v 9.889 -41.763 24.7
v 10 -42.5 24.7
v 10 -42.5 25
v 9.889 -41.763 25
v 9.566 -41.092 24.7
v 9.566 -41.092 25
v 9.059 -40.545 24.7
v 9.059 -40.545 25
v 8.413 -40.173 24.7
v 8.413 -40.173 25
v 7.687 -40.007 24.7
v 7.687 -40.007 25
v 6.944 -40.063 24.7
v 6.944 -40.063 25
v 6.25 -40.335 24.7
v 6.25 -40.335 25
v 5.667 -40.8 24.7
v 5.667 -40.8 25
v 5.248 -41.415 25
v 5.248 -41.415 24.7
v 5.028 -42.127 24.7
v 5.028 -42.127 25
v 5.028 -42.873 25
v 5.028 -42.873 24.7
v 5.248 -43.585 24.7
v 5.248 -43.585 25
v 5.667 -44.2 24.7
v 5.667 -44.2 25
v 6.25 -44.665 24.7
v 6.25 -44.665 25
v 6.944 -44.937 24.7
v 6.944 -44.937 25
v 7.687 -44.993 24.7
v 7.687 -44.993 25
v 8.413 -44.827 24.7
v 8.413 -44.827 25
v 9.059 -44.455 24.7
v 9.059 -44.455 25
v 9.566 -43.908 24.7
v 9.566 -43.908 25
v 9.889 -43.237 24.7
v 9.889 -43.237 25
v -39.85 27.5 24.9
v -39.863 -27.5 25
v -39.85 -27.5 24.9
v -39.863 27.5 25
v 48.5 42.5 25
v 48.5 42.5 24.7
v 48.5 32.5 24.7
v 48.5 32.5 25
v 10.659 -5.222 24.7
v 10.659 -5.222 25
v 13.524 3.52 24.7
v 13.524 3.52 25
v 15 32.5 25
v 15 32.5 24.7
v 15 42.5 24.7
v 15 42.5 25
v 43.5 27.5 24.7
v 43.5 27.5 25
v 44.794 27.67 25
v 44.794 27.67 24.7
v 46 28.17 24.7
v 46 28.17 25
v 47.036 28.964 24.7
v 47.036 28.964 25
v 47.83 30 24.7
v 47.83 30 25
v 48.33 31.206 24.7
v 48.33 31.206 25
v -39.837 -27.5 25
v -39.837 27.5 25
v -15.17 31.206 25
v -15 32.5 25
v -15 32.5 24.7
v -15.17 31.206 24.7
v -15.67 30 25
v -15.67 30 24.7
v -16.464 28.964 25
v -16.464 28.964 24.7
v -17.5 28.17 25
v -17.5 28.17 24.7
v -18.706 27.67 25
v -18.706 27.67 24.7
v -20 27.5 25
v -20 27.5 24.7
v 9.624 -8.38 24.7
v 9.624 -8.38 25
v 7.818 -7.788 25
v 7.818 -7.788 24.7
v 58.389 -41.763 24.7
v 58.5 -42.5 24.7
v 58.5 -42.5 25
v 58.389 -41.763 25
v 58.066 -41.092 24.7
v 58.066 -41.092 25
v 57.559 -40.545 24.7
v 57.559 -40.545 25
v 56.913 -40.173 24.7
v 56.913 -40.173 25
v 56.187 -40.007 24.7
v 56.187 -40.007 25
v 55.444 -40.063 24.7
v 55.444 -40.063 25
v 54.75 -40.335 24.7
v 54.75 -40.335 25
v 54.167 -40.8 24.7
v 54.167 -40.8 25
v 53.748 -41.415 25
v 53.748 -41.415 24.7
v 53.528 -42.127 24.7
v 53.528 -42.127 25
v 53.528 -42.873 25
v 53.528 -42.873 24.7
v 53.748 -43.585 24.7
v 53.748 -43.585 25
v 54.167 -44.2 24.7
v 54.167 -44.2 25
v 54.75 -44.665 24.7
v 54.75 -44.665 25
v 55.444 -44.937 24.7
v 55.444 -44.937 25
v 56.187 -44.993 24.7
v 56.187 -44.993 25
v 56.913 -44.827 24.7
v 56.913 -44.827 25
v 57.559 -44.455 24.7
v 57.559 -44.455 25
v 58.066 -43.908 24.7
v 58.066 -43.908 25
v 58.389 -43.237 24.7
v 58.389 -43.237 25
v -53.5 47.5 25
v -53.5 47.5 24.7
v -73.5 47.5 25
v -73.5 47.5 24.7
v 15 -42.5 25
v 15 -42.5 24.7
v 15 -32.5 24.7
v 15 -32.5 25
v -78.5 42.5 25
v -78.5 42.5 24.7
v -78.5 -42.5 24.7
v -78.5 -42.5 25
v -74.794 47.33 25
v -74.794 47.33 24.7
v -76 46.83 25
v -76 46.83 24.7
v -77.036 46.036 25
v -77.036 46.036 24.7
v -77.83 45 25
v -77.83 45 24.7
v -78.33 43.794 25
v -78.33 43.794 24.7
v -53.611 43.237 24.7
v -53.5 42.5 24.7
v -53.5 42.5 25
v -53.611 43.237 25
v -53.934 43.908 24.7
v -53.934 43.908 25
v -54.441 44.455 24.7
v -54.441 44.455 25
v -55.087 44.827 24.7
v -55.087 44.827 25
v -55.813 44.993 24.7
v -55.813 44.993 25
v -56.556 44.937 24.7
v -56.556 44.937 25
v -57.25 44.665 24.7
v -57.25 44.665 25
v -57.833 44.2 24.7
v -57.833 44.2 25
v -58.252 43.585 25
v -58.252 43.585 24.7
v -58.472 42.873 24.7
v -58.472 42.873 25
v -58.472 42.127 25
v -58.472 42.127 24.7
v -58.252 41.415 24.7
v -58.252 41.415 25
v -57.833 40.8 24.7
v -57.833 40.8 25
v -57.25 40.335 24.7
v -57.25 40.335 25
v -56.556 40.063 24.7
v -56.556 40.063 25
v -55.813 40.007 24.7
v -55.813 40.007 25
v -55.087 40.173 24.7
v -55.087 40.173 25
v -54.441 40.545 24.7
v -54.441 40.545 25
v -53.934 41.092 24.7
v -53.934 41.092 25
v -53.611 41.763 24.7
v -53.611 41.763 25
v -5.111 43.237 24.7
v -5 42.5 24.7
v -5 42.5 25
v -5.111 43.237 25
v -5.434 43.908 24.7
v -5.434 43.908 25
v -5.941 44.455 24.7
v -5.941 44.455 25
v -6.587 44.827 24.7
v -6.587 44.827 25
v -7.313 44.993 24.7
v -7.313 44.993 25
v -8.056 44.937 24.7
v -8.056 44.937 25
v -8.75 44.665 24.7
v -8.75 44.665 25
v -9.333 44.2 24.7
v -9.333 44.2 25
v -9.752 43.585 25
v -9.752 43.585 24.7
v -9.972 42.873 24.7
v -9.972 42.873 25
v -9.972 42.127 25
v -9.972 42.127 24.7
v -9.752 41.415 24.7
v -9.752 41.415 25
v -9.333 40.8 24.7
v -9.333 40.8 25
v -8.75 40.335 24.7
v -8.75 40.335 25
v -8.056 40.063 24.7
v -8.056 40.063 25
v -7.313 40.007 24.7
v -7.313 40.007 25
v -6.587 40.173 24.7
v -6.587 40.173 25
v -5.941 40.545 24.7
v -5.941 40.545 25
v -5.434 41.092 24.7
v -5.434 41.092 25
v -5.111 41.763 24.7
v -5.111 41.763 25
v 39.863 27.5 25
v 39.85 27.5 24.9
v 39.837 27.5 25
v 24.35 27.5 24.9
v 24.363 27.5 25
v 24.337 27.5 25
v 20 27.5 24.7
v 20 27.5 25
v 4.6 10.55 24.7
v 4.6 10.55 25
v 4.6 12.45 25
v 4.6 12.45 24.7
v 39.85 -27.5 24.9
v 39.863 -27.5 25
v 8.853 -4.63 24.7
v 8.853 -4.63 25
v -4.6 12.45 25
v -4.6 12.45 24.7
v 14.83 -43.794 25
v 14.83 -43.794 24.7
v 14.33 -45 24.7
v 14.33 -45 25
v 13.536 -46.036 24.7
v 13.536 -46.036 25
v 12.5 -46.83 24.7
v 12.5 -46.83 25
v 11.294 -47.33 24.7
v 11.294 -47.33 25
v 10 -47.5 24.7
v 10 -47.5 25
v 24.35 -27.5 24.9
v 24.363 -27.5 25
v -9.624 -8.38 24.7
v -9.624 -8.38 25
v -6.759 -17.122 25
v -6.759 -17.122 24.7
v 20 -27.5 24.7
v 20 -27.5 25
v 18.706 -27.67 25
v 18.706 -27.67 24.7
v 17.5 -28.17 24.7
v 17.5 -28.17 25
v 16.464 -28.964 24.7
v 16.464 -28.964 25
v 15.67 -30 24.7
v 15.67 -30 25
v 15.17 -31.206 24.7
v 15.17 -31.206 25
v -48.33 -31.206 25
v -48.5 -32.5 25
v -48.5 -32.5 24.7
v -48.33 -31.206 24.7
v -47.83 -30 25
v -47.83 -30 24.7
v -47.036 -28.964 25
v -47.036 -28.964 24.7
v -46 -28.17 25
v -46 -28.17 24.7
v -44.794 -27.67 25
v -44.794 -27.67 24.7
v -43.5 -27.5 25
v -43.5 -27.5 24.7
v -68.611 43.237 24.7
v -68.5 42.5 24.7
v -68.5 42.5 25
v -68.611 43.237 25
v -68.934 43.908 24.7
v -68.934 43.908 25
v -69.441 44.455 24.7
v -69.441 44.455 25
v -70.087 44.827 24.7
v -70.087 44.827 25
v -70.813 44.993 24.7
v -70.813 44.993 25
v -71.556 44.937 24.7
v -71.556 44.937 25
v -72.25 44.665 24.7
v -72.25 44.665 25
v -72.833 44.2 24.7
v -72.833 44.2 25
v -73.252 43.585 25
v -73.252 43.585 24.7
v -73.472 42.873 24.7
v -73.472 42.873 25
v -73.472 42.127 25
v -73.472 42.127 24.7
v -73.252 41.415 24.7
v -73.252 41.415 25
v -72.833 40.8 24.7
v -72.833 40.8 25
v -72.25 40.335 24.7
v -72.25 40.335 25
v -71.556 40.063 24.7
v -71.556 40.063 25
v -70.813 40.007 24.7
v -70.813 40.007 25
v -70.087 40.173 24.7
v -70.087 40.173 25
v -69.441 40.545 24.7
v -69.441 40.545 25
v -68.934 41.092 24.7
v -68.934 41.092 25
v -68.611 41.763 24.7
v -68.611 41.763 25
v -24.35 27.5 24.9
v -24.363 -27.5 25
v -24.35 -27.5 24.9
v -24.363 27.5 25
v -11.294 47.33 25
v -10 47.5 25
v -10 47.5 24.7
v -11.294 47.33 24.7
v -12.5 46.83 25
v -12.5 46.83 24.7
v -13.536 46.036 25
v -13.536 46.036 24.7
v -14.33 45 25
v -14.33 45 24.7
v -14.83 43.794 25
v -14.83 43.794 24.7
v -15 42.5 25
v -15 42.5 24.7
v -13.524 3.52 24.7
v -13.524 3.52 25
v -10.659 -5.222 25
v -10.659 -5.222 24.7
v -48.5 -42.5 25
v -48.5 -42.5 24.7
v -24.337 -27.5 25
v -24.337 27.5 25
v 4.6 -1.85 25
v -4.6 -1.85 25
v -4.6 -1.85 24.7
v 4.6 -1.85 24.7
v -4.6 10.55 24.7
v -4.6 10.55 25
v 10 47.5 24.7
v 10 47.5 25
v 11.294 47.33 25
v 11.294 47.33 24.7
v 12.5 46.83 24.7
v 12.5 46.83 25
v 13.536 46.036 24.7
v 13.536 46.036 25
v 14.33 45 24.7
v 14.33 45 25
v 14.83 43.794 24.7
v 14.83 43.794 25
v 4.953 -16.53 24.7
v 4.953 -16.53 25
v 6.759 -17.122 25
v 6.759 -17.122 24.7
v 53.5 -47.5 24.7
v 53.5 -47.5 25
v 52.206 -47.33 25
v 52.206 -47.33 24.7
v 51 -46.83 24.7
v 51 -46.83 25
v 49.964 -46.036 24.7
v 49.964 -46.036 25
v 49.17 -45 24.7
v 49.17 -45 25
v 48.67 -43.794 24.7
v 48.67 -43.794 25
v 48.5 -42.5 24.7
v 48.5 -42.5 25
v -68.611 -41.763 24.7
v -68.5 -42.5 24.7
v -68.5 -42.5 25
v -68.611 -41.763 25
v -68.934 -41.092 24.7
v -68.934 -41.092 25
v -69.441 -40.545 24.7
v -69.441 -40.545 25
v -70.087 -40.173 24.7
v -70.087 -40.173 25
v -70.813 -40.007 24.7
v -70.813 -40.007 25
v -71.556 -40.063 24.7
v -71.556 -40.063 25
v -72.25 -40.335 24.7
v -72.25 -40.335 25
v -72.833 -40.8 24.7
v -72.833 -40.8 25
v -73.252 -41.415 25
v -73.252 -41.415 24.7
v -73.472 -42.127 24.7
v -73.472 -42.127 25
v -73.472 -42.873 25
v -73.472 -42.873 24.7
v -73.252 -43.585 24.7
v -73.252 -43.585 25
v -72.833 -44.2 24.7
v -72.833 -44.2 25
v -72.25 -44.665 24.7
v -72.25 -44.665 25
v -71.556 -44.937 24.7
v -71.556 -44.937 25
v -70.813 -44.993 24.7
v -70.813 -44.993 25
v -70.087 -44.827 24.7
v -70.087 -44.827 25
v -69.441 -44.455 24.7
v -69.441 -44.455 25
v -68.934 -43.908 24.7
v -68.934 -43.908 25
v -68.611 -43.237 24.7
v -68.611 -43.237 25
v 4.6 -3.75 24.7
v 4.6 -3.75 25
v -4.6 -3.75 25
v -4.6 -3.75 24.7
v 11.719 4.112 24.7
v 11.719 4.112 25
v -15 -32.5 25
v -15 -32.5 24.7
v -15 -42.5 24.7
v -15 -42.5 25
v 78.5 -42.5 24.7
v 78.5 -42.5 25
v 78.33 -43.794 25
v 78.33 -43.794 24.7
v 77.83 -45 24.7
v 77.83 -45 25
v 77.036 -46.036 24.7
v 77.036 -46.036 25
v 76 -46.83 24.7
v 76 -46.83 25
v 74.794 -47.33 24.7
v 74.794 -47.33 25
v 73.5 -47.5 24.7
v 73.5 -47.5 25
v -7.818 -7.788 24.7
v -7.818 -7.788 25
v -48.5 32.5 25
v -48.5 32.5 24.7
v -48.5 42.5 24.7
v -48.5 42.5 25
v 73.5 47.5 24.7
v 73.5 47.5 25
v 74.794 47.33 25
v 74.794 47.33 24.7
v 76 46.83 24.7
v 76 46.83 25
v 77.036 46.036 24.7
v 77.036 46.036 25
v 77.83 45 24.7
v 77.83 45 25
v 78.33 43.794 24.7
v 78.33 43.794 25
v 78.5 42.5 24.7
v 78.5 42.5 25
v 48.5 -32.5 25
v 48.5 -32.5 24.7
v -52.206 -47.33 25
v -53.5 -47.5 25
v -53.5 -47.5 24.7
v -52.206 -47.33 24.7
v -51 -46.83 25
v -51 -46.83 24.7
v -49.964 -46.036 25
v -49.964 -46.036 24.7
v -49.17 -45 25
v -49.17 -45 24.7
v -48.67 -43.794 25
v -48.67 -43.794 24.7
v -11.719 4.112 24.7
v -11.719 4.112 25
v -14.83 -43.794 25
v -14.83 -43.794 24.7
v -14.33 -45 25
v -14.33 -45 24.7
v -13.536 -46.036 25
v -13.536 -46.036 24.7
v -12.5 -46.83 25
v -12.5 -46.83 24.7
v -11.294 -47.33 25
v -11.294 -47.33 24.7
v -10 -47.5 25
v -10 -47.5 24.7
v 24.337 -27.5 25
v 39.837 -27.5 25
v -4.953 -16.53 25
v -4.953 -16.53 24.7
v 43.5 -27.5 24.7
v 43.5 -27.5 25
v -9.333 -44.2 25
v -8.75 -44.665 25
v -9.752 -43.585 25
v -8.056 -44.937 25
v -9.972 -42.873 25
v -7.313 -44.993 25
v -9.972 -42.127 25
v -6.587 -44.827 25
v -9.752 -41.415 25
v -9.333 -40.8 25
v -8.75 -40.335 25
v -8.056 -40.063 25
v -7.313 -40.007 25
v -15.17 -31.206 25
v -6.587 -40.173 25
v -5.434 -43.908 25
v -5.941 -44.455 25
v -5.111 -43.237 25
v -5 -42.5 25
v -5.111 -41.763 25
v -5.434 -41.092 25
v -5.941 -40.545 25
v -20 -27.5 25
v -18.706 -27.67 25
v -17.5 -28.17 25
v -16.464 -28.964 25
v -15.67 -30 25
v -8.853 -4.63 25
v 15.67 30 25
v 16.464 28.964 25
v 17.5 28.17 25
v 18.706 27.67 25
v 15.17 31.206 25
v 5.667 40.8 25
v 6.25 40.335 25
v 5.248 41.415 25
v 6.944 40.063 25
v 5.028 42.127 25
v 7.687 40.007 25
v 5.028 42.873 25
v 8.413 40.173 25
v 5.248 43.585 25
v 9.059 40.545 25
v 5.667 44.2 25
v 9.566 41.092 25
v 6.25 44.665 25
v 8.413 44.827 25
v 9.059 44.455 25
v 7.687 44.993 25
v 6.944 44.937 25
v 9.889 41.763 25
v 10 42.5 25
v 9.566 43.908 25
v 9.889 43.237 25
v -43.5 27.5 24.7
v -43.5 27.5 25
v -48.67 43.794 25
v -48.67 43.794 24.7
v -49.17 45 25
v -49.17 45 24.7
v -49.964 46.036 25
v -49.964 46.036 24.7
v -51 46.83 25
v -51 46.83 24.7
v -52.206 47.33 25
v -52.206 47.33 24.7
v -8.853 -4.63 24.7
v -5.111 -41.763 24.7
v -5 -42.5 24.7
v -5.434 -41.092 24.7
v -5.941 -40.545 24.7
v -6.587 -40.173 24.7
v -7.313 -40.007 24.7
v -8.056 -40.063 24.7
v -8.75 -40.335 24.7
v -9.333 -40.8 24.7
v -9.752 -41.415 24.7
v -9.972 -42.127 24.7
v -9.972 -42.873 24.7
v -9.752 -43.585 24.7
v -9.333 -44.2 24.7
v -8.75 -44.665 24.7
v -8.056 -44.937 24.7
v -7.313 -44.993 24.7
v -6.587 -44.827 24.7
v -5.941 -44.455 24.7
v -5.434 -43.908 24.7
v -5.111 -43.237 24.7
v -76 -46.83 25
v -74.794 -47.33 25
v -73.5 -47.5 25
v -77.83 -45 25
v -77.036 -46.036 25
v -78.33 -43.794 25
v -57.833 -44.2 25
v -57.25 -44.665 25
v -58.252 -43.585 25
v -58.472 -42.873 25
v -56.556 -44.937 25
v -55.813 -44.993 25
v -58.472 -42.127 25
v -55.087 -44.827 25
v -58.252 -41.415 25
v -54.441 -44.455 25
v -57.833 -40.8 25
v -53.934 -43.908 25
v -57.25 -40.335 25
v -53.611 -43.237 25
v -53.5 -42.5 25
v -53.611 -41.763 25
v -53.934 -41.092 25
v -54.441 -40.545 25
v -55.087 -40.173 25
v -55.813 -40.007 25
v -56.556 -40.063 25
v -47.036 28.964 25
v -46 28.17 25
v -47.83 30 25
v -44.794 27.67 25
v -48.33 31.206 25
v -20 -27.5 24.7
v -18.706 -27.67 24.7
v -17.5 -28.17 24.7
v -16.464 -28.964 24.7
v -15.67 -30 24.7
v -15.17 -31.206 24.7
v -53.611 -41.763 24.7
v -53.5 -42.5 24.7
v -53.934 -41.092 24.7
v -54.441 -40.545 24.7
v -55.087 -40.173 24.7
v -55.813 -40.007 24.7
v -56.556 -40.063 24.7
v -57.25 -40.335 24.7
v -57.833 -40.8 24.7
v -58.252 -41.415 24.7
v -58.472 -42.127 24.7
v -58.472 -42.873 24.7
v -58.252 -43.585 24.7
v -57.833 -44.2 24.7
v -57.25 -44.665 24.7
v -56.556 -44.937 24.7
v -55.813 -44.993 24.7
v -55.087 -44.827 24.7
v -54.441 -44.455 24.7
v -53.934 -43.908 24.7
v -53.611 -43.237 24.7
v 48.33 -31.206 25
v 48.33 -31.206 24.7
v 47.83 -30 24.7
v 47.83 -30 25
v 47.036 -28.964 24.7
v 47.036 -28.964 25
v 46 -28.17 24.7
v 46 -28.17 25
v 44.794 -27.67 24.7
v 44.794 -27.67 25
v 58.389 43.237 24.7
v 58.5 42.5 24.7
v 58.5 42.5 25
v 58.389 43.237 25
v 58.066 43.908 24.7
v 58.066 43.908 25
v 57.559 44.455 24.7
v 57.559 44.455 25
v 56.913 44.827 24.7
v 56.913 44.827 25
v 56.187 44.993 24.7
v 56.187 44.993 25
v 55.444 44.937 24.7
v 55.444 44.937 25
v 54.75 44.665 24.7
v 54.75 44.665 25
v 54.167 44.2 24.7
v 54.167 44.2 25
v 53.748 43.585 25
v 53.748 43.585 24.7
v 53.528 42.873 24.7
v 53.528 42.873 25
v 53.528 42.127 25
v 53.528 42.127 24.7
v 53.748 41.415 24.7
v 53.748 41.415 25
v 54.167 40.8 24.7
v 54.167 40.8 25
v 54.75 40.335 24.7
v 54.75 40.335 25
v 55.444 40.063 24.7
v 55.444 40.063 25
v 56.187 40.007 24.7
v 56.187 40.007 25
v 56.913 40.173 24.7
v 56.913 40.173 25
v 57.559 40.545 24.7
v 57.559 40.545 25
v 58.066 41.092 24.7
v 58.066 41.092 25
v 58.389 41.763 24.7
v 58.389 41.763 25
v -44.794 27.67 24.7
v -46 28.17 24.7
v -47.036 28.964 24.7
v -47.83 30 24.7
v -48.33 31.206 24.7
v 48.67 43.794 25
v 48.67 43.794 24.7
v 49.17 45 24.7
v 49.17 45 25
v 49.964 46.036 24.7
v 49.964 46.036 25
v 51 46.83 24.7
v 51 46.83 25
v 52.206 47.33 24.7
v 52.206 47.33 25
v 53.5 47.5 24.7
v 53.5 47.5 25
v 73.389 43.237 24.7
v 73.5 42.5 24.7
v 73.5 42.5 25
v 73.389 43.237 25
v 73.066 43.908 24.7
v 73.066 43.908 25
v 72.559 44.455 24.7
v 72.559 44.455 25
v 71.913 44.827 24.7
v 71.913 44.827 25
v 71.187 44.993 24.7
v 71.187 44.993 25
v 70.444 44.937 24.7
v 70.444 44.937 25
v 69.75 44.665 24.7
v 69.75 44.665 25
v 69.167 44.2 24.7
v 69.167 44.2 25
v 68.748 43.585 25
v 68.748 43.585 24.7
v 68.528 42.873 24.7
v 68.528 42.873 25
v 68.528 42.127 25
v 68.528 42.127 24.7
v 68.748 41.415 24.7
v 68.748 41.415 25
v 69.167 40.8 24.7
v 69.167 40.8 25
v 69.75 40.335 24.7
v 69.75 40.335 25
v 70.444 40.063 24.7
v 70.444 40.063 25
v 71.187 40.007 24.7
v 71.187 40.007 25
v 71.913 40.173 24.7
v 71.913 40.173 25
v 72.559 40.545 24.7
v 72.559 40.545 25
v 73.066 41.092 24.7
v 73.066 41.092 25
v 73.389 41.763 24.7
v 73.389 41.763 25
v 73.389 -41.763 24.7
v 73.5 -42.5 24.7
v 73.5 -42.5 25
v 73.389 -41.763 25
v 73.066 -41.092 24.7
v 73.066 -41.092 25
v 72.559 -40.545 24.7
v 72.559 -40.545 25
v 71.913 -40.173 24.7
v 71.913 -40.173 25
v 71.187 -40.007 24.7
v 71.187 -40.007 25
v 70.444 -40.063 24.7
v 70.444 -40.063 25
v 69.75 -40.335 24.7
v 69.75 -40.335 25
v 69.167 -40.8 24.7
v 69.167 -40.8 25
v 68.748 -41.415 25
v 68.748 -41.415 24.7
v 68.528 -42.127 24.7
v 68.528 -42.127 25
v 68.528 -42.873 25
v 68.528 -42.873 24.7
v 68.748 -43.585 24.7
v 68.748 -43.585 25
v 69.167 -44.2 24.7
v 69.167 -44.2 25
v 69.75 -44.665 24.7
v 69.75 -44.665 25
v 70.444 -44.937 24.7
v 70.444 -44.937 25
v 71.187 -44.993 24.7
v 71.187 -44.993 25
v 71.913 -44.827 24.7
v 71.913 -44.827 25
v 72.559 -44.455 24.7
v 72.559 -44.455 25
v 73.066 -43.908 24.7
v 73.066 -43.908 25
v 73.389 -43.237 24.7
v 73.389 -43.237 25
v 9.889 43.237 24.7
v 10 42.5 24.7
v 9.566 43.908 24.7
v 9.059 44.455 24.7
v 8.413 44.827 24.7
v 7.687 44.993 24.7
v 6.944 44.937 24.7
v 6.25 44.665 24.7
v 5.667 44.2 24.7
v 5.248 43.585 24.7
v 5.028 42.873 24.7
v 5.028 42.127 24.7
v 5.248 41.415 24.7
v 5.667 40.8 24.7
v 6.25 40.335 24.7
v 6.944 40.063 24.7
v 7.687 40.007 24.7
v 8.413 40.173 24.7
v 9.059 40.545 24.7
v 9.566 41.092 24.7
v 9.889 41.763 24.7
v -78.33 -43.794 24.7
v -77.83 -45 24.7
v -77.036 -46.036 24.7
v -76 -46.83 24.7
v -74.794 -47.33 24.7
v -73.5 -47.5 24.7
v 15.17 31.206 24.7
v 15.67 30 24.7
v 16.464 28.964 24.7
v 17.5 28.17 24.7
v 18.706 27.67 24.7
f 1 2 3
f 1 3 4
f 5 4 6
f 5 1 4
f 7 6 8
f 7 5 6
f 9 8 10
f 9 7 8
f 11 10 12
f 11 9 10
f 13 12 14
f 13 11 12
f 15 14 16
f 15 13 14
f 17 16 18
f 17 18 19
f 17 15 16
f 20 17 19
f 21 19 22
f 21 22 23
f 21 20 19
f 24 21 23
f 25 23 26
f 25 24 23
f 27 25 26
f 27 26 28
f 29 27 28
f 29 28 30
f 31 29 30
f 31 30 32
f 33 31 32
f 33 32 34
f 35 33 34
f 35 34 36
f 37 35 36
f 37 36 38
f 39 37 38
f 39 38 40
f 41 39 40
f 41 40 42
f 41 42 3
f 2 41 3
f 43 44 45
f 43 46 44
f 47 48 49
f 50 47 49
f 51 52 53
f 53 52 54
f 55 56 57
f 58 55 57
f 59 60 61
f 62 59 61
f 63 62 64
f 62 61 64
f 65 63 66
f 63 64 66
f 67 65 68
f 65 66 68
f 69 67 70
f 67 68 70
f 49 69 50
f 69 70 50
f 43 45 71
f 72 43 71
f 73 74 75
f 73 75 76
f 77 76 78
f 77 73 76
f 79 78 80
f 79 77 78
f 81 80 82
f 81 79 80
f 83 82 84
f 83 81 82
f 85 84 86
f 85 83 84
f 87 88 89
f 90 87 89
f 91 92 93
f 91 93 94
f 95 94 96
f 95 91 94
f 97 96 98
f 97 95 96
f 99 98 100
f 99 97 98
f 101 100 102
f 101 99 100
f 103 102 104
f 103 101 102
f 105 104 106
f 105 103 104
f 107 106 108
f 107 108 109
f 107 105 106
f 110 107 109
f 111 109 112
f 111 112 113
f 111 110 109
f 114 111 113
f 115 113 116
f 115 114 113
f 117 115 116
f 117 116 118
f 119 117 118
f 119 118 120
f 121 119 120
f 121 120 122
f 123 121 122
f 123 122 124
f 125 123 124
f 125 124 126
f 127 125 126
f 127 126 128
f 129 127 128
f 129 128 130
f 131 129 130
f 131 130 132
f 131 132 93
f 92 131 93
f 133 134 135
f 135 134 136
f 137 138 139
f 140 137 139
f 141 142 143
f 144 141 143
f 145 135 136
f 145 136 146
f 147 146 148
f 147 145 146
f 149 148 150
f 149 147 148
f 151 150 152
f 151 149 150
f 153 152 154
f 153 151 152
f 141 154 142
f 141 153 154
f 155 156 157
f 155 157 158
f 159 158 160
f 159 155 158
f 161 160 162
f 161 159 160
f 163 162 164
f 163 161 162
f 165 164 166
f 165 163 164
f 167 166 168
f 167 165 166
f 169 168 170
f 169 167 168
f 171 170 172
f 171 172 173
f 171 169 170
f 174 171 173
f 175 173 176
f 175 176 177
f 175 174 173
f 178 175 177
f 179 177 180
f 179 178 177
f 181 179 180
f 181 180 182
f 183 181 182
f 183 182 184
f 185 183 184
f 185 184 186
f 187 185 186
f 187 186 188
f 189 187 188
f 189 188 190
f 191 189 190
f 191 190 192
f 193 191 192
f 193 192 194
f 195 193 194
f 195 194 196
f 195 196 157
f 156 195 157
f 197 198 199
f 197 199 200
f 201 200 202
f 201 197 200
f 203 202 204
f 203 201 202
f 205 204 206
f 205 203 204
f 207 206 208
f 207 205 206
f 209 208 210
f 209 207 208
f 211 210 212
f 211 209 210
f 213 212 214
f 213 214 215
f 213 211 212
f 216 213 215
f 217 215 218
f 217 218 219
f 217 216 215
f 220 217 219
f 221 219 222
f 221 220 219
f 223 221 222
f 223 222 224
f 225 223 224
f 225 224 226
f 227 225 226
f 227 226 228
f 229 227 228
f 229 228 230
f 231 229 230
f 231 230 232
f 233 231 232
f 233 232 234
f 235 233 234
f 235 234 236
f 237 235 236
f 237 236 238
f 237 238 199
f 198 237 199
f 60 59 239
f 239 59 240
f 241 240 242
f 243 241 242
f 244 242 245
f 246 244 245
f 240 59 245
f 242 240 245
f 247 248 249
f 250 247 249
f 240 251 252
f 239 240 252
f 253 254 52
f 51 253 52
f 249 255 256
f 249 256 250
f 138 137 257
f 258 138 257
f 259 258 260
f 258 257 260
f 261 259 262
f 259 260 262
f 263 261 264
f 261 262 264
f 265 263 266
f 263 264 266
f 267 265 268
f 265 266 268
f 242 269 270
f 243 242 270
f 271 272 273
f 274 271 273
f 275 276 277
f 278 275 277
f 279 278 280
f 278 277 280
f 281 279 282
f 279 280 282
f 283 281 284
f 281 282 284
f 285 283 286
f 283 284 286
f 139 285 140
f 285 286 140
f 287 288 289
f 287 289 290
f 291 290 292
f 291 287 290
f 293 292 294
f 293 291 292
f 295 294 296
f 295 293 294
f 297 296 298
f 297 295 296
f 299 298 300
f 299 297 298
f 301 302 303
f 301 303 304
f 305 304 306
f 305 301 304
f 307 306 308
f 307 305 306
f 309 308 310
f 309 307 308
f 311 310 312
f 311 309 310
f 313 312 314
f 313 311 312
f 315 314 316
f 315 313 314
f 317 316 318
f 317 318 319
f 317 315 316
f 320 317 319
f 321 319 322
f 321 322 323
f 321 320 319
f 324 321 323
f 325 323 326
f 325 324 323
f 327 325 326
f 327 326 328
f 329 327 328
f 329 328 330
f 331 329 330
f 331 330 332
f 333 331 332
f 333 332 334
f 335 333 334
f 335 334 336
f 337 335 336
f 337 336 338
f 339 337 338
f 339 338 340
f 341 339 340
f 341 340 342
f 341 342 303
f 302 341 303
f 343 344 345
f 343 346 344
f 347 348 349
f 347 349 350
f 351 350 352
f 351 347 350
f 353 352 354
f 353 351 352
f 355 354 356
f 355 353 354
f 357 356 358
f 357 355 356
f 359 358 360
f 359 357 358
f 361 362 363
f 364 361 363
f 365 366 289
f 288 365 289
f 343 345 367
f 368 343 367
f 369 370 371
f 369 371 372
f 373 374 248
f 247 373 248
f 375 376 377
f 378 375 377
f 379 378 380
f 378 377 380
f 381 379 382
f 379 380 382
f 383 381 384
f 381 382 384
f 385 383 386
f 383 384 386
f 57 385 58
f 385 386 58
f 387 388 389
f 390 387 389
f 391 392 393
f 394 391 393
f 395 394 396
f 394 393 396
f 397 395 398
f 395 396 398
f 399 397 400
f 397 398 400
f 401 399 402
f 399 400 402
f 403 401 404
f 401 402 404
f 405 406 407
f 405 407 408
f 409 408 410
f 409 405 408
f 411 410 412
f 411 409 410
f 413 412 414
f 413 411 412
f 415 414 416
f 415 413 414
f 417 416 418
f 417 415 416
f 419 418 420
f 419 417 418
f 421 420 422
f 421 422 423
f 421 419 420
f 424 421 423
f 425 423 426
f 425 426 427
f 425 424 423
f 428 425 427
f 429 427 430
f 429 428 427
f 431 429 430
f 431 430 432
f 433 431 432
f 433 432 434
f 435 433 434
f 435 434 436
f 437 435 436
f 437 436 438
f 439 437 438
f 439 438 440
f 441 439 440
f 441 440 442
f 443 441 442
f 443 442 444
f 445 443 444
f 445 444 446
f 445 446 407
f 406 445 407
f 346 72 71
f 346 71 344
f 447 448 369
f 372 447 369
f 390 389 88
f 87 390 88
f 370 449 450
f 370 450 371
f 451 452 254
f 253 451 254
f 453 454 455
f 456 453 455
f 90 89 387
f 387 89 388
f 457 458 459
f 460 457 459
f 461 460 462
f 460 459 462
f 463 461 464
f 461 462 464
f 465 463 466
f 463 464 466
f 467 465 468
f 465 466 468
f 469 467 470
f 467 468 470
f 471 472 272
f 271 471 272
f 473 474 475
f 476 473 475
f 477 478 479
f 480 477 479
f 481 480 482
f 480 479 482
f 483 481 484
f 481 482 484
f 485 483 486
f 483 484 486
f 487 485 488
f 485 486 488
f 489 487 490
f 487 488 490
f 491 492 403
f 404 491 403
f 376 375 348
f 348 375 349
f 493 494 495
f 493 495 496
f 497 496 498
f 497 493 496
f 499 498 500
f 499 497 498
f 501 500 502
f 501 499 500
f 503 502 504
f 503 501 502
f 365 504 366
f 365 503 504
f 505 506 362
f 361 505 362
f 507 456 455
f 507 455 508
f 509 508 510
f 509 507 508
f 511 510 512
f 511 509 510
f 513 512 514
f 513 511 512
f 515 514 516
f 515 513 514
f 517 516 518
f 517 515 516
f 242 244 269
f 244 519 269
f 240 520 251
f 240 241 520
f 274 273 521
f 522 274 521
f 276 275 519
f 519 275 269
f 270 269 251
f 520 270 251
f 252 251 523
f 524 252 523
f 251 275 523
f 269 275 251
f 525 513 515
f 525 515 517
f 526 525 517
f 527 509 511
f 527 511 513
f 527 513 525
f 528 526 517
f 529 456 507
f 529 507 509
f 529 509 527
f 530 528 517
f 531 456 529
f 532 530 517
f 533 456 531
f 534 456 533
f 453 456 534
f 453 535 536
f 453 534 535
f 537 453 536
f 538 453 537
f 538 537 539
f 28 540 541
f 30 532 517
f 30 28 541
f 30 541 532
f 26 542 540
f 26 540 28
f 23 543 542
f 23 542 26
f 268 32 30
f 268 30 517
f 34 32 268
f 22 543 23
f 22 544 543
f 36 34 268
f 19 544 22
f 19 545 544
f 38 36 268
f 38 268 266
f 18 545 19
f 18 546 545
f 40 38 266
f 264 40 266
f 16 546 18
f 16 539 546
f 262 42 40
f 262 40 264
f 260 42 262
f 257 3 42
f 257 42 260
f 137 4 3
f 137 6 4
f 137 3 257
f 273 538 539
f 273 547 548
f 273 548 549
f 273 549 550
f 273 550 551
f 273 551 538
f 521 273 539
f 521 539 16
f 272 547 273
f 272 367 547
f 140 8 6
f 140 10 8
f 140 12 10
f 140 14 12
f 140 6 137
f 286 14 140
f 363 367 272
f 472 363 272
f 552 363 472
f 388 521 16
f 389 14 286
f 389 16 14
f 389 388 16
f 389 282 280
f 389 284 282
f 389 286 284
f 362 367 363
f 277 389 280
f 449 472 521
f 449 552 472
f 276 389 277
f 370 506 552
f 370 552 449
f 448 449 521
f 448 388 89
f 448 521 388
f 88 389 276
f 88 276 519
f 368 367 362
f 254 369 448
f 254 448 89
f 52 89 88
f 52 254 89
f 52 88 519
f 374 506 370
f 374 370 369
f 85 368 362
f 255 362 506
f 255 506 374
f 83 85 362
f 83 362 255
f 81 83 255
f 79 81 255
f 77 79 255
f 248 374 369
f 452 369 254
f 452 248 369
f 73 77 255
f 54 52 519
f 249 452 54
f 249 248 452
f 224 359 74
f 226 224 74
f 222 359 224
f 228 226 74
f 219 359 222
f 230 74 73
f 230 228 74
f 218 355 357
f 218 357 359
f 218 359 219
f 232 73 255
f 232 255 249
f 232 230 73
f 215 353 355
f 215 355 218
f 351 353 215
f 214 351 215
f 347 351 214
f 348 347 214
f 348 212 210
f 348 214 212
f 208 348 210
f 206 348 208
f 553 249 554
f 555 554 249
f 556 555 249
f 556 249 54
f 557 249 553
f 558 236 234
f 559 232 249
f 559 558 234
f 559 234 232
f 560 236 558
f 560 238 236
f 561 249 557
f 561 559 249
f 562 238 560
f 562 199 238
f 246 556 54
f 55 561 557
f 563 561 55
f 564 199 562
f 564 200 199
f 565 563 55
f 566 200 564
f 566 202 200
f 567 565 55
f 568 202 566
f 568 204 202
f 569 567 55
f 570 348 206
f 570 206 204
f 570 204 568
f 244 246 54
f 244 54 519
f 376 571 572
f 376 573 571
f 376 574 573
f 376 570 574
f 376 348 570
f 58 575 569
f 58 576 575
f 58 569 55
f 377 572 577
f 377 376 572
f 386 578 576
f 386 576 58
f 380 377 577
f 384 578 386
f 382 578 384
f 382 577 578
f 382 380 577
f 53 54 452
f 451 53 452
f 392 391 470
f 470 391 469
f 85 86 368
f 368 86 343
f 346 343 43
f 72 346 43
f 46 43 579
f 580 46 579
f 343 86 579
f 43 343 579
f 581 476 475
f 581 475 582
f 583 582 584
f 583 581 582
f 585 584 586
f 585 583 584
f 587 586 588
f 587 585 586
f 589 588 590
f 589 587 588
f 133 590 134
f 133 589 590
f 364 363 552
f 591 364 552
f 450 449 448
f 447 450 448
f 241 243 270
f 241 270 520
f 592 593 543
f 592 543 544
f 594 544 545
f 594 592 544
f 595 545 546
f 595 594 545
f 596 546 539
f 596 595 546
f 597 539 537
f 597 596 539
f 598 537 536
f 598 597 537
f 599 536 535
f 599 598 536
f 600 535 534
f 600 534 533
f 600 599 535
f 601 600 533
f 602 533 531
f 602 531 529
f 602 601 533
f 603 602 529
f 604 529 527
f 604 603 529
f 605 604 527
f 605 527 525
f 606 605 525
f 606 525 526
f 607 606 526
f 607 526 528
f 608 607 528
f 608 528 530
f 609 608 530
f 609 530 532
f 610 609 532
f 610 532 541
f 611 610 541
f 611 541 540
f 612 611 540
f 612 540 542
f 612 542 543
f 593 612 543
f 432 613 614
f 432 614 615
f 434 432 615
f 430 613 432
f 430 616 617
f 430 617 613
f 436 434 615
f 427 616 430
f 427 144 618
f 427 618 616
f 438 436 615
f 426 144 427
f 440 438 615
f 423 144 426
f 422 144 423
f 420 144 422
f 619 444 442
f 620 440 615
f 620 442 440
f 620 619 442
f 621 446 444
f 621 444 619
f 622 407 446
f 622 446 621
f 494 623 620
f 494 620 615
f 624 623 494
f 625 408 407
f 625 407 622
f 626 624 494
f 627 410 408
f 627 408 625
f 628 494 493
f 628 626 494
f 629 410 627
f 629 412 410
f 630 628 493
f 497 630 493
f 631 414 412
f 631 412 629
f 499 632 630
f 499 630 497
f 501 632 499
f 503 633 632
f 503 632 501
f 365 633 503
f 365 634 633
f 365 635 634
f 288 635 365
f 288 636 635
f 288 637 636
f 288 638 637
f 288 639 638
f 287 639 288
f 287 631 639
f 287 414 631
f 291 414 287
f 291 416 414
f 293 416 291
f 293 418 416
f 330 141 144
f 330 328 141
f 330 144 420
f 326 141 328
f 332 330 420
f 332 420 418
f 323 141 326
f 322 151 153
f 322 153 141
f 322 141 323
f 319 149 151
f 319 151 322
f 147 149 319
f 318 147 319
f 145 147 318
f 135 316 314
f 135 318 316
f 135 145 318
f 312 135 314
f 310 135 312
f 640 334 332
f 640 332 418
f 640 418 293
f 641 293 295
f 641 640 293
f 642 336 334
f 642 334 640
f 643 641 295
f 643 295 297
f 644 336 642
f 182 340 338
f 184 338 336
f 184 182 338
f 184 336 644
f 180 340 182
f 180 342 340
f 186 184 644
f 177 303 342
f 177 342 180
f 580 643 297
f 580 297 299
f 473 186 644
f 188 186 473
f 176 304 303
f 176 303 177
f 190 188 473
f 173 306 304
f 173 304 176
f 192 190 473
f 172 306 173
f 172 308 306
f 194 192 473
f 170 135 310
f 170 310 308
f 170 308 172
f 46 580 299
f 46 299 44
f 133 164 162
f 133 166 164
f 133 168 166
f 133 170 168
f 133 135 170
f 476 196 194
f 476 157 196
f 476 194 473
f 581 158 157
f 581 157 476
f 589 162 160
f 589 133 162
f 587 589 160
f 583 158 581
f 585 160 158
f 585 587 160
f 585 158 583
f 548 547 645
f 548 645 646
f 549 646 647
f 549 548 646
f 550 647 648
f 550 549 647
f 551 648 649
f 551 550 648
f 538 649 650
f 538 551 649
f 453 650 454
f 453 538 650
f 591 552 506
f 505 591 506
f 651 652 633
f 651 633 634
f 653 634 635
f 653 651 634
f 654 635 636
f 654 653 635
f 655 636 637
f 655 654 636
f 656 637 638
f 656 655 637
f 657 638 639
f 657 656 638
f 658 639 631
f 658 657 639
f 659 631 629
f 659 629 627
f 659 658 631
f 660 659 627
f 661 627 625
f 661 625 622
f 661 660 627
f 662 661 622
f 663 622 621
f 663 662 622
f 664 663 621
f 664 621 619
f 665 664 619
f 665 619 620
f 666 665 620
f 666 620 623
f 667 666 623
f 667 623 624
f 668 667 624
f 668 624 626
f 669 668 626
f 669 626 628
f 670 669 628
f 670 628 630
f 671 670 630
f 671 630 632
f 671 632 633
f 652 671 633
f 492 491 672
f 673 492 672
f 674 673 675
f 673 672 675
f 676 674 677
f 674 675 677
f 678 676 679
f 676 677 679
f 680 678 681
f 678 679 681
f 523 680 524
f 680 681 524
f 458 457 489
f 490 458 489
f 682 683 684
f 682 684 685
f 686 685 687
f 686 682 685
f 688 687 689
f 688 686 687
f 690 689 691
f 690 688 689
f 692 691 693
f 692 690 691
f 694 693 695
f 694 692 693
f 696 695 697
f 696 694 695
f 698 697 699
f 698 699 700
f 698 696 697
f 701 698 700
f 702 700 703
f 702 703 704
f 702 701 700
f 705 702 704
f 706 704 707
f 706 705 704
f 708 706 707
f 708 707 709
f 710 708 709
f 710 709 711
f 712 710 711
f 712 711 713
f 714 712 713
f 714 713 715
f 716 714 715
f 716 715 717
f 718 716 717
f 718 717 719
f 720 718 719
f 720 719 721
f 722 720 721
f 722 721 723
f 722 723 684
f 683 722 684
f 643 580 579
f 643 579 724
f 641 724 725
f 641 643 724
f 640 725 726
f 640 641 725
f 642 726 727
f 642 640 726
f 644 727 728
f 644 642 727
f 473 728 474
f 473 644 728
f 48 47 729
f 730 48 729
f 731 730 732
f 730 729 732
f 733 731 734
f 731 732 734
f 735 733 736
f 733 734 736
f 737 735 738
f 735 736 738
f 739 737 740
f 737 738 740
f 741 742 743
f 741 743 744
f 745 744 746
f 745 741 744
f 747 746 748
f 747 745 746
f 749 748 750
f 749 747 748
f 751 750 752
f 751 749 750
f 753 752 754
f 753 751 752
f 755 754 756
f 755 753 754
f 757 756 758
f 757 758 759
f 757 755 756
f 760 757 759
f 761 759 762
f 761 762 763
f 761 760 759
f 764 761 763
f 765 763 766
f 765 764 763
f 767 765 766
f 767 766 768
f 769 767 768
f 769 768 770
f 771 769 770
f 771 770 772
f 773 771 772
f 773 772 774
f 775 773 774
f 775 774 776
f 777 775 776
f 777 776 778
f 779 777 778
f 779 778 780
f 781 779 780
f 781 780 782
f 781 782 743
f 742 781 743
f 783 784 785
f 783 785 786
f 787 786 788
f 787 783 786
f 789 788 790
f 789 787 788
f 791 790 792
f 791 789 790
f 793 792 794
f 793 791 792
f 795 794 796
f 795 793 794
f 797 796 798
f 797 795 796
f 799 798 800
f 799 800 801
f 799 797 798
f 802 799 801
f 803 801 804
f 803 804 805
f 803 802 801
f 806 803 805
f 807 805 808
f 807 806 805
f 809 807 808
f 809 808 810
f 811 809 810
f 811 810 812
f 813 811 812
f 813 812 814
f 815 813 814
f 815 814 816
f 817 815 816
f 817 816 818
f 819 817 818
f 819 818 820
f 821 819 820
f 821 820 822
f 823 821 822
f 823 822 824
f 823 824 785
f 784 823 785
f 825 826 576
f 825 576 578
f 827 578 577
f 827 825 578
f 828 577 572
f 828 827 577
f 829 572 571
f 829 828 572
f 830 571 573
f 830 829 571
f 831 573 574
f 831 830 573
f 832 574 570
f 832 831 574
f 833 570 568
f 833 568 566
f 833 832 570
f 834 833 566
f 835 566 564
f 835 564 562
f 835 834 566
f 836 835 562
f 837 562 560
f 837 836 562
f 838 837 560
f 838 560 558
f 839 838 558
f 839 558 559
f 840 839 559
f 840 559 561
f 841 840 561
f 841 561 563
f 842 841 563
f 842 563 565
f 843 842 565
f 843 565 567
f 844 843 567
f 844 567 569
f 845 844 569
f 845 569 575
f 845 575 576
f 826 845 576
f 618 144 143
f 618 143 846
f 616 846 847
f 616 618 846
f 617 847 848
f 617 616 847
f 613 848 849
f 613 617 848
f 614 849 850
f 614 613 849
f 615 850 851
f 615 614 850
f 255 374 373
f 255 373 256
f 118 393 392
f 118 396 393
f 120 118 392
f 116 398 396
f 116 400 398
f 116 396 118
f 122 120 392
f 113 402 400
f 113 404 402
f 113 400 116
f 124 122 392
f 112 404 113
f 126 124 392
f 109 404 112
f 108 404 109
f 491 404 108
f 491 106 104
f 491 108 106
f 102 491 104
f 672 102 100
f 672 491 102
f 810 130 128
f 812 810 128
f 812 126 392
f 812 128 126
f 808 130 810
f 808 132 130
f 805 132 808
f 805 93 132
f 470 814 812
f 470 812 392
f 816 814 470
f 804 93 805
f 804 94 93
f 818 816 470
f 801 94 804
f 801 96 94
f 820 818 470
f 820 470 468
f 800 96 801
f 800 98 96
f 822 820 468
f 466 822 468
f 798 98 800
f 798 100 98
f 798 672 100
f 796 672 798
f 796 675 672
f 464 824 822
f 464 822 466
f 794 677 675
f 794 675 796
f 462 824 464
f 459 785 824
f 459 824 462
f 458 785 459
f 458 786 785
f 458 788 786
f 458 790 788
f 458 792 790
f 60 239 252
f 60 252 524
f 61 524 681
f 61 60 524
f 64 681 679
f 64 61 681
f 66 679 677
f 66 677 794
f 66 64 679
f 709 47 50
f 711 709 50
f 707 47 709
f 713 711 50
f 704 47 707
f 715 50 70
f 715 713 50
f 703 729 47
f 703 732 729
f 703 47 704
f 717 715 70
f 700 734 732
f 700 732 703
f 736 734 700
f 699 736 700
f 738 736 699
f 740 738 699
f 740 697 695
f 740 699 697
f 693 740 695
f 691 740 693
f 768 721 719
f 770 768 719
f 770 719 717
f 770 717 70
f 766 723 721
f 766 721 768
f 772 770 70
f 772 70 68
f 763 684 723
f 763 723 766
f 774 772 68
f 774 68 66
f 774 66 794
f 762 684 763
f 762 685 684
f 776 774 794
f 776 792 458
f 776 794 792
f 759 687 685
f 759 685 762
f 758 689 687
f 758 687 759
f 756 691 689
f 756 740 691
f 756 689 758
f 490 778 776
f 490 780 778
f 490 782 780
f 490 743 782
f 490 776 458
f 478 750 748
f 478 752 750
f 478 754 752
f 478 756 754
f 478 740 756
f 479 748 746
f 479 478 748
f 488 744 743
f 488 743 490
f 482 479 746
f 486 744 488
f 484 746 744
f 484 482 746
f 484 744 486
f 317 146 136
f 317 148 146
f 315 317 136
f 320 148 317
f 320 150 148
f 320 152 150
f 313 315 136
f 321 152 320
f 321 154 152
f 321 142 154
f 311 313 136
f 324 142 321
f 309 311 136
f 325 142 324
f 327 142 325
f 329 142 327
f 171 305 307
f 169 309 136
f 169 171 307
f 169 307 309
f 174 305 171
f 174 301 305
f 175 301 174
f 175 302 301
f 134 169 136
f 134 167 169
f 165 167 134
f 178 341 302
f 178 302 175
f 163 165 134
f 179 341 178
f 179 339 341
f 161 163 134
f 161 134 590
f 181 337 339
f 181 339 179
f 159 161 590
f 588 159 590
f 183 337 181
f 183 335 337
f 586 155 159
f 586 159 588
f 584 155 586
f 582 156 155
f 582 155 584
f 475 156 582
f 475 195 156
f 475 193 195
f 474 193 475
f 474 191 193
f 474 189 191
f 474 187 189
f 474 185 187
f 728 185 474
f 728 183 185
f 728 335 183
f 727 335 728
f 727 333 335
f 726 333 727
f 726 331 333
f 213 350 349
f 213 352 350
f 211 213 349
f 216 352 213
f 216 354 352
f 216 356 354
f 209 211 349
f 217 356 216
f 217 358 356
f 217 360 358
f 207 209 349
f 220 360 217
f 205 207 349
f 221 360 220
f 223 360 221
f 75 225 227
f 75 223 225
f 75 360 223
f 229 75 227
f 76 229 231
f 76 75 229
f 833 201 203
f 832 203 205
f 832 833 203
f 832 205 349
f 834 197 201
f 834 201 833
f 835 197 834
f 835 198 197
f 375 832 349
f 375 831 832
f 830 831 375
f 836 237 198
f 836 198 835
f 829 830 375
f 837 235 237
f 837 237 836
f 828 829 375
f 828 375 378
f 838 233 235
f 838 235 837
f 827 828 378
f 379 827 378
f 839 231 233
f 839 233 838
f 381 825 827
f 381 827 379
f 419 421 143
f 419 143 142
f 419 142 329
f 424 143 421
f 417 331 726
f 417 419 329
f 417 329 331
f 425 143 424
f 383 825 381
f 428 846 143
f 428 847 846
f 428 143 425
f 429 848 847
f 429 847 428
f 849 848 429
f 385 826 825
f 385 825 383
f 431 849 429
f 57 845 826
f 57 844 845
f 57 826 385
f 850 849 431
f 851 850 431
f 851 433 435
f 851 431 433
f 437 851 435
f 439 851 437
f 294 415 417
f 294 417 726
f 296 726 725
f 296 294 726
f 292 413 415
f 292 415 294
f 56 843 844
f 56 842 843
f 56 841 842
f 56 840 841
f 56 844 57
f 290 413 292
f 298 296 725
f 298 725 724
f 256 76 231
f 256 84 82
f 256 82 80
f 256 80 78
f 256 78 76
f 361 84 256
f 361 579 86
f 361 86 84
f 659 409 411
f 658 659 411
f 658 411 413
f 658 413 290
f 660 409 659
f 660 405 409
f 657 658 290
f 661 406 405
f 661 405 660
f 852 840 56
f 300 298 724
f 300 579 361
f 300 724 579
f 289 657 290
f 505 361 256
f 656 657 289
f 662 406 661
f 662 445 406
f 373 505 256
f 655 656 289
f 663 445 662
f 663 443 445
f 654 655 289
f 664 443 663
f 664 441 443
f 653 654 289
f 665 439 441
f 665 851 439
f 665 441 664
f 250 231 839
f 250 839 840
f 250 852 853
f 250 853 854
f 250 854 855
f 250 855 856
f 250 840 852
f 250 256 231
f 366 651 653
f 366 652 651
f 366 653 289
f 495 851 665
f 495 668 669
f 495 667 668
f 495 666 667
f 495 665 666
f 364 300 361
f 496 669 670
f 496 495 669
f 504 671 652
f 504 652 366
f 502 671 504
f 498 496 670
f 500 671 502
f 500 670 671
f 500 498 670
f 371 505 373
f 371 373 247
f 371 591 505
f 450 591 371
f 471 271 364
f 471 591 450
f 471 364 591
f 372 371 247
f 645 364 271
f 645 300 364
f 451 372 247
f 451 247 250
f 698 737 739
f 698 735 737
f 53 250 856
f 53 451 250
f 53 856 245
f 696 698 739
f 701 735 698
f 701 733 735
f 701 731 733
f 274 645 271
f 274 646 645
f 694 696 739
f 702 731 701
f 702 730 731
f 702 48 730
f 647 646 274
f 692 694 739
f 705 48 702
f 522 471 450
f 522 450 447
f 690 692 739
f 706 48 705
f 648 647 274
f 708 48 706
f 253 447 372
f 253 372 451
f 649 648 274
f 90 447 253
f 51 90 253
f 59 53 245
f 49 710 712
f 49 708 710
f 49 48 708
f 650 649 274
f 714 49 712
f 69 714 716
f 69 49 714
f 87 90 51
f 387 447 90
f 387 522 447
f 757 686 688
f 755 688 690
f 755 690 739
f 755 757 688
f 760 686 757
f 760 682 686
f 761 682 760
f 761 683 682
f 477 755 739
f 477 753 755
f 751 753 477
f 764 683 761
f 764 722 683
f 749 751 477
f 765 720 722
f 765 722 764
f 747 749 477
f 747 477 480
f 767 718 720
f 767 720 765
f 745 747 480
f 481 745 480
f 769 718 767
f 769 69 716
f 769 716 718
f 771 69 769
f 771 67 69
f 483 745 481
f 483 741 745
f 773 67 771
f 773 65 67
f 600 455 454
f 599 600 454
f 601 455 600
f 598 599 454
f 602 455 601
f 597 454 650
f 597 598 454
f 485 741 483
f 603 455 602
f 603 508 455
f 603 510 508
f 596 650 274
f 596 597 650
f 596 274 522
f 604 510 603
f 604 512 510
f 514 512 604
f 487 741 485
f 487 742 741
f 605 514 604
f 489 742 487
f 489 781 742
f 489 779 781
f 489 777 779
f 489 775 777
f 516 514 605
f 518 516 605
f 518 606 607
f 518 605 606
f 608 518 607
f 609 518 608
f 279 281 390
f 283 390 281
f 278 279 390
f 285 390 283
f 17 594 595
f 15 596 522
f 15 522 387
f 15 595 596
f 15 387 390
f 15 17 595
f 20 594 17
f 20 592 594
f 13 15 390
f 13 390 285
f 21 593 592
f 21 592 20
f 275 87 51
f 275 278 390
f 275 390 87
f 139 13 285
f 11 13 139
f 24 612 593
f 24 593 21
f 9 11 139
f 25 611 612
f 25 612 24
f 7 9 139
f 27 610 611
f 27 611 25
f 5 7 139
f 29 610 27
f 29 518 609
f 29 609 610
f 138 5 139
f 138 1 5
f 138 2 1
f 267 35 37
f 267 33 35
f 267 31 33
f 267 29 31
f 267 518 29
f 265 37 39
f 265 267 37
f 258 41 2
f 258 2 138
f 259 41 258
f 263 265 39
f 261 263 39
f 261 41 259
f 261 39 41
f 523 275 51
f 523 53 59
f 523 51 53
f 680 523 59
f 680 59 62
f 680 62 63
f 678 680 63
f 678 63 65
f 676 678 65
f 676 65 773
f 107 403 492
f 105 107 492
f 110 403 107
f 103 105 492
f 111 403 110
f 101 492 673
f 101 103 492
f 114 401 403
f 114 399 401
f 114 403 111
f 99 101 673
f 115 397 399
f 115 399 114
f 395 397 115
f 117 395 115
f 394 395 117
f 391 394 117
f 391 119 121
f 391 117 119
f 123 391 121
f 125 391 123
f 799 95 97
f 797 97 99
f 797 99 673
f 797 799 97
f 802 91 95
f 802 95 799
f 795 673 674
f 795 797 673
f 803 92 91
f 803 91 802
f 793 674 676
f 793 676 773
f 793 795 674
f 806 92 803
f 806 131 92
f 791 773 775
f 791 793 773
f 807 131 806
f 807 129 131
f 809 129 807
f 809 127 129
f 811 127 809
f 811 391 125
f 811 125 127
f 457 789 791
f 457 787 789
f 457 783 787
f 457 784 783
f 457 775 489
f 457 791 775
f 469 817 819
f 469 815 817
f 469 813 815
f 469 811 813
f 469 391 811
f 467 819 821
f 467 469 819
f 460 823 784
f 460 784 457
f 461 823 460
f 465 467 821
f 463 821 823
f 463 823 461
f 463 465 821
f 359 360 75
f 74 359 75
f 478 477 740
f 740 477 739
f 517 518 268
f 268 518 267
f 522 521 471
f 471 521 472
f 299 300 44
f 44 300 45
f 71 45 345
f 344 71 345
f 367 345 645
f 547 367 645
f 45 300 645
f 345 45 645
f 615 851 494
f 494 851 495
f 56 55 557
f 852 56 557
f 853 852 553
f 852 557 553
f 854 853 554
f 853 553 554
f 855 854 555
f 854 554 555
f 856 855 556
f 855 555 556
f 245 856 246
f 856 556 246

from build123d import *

# Parameters (mm, degrees)
F0_R     = 2.5
F1_DEPTH = 25
F2_DEPTH = 25
F3_W     = 9.2
F3_H     = 1.9
F4_DEPTH = 25
F5_R     = 5
F7_DEPTH = 40
F8_W     = 165.974393075
F8_H     = 32.5776245729
F9_DEPTH = 97


with BuildPart() as f1:
    # F0 (on Top) → F1 (new body)
    with BuildSketch(Plane.XY):
        Polygon((15, 47.5), (-15, 47.5), (-15, 27.5), (-48.5, 27.5), (-48.5, 47.5), (-78.5, 47.5), (-78.5, -47.5), (-48.5, -47.5), (-48.5, -27.5), (-15, -27.5), (-15, -47.5), (15, -47.5), (15, -27.5), (48.5, -27.5), (48.5, -47.5), (78.5, -47.5), (78.5, 47.5), (48.5, 47.5), (48.5, 27.5), (15, 27.5), align=None)
        with Locations((-71, -42.5)):
            Circle(F0_R, mode=Mode.SUBTRACT)
        with Locations((-56, -42.5)):
            Circle(F0_R, mode=Mode.SUBTRACT)
        with Locations((-7.5, -42.5)):
            Circle(F0_R, mode=Mode.SUBTRACT)
        with Locations((7.5, -42.5)):
            Circle(F0_R, mode=Mode.SUBTRACT)
        with Locations((56, -42.5)):
            Circle(F0_R, mode=Mode.SUBTRACT)
        with Locations((71, -42.5)):
            Circle(F0_R, mode=Mode.SUBTRACT)
        with Locations((-71, 42.5)):
            Circle(F0_R, mode=Mode.SUBTRACT)
        with Locations((-56, 42.5)):
            Circle(F0_R, mode=Mode.SUBTRACT)
        with Locations((-7.5, 42.5)):
            Circle(F0_R, mode=Mode.SUBTRACT)
        with Locations((7.5, 42.5)):
            Circle(F0_R, mode=Mode.SUBTRACT)
        with Locations((56, 42.5)):
            Circle(F0_R, mode=Mode.SUBTRACT)
        with Locations((71, 42.5)):
            Circle(F0_R, mode=Mode.SUBTRACT)
    extrude(amount=F1_DEPTH)

    # F0 (on Top) → F2 (cut)
    with BuildSketch(Plane.XY):
        Polygon((15, 47.5), (-15, 47.5), (-15, 27.5), (-48.5, 27.5), (-48.5, 47.5), (-78.5, 47.5), (-78.5, -47.5), (-48.5, -47.5), (-48.5, -27.5), (-15, -27.5), (-15, -47.5), (15, -47.5), (15, -27.5), (48.5, -27.5), (48.5, -47.5), (78.5, -47.5), (78.5, 47.5), (48.5, 47.5), (48.5, 27.5), (15, 27.5), align=None)
        with Locations((-71, -42.5)):
            Circle(F0_R, mode=Mode.SUBTRACT)
        with Locations((-56, -42.5)):
            Circle(F0_R, mode=Mode.SUBTRACT)
        with Locations((-7.5, -42.5)):
            Circle(F0_R, mode=Mode.SUBTRACT)
        with Locations((7.5, -42.5)):
            Circle(F0_R, mode=Mode.SUBTRACT)
        with Locations((56, -42.5)):
            Circle(F0_R, mode=Mode.SUBTRACT)
        with Locations((71, -42.5)):
            Circle(F0_R, mode=Mode.SUBTRACT)
        with Locations((-71, 42.5)):
            Circle(F0_R, mode=Mode.SUBTRACT)
        with Locations((-56, 42.5)):
            Circle(F0_R, mode=Mode.SUBTRACT)
        with Locations((-7.5, 42.5)):
            Circle(F0_R, mode=Mode.SUBTRACT)
        with Locations((7.5, 42.5)):
            Circle(F0_R, mode=Mode.SUBTRACT)
        with Locations((56, 42.5)):
            Circle(F0_R, mode=Mode.SUBTRACT)
        with Locations((71, 42.5)):
            Circle(F0_R, mode=Mode.SUBTRACT)
    extrude(amount=-F2_DEPTH, mode=Mode.SUBTRACT)

    # F3 (on face) → F4 (cut)
    with BuildSketch(Plane.XY.offset(25)):
        with Locations((0, 11.5)):
            Rectangle(F3_W, F3_H)
        with Locations((0, -2.8)):
            Rectangle(F3_W, F3_H)
        Polygon((-8.8533070383, -4.6304771843), (-11.71855, 4.11197), (-13.5240553968, 3.5202350405), (-10.658812435, -5.2222121438), align=None)
        Polygon((-6.7587246898, -17.1221841819), (-4.953219293, -16.5304492224), (-7.8184622548, -7.7880020381), (-9.6239676515, -8.3797369976), align=None)
        Polygon((13.5240553968, 3.5202350405), (11.71855, 4.11197), (8.8533070383, -4.6304771843), (10.658812435, -5.2222121438), align=None)
        Polygon((7.8184622548, -7.7880020381), (4.953219293, -16.5304492224), (6.7587246898, -17.1221841819), (9.6239676515, -8.3797369976), align=None)
    extrude(amount=-F4_DEPTH, mode=Mode.SUBTRACT)

    # F5
    f5_edges = [f1.edges().sort_by_distance(p)[0] for p in [
        (-48.5, 47.5, 12.5),
        (-48.5, 27.5, 12.5),
        (15, 47.5, 12.5),
        (15, 27.5, 12.5),
        (78.5, 47.5, 12.5),
        (48.5, 47.5, 12.5),
        (-15, 47.5, 12.5),
        (48.5, 27.5, 12.5),
        (-15, 27.5, 12.5),
        (-78.5, 47.5, 12.5),
        (15, -27.5, 12.5),
        (15, -47.5, 12.5),
        (78.5, -47.5, 12.5),
        (-48.5, -27.5, 12.5),
        (-48.5, -47.5, 12.5),
        (48.5, -27.5, 12.5),
        (48.5, -47.5, 12.5),
        (-15, -27.5, 12.5),
        (-15, -47.5, 12.5),
        (-78.5, -47.5, 12.5),
    ]]
    fillet(f5_edges, radius=F5_R)

    # F6 (on Front) → F7 (cut, symmetric)
    with BuildSketch(Plane.XZ):
        Polygon((-38.85, 32.4957541127), (-40.85, 32.4957541127), (-39.85, 24.9), align=None)
        Polygon((39.85, 24.9), (40.85, 32.4957541127), (38.85, 32.4957541127), align=None)
        Polygon((-23.35, 32.4957541127), (-25.35, 32.4957541127), (-24.35, 24.9), align=None)
        Polygon((24.35, 24.9), (25.35, 32.4957541127), (23.35, 32.4957541127), align=None)
    extrude(amount=F7_DEPTH, both=True, mode=Mode.SUBTRACT)

    # F8 (on face) → F9 (cut)
    with BuildSketch(Plane.XZ.offset(47.5)):
        with Locations((2.9871965375, 8.4111877136)):
            Rectangle(F8_W, F8_H)
    extrude(amount=-F9_DEPTH, mode=Mode.SUBTRACT)


solid = f1.part
